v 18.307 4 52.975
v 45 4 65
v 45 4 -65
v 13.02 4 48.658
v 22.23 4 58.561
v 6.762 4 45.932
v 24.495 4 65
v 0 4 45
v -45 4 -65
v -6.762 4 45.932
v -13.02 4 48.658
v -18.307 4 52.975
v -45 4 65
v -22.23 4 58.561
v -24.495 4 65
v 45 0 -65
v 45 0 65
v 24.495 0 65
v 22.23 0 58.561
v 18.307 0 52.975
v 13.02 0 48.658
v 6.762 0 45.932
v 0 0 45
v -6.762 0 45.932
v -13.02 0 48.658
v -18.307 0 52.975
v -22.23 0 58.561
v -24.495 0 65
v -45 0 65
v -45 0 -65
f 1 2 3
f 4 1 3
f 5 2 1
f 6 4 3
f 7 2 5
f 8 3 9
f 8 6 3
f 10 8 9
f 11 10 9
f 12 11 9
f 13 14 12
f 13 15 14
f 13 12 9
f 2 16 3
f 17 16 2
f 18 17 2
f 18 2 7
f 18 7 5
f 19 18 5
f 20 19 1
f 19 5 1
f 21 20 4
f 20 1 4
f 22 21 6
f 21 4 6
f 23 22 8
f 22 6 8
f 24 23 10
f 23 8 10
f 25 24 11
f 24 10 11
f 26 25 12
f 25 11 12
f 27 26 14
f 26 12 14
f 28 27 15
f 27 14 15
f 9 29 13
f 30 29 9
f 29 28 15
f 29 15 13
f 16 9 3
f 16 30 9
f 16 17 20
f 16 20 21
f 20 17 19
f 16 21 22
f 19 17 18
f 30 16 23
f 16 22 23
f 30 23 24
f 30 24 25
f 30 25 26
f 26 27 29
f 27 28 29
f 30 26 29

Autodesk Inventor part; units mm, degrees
ref_plane "YZ Plane" through (0, 0, 0) normal (1, 0, 0) x (0, 1, 0)
ref_plane "XZ Plane" through (0, 0, 0) normal (0, 1, 0) x (-1, 0, 0)
ref_plane "XY Plane" through (0, 0, 0) normal (0, 0, 1) x (1, 0, 0)
sketch "Sketch1" plane through (0, 0, 0) normal (0, 1, 0) x (-1, 0, 0)
  line L0 (-45, 65) -> (45, 65)
  line L1 (45, 65) -> (45, -65)
  line L2 (45, -65) -> (-45, -65)
  line L3 (-45, -65) -> (-45, 65)
  line L4 (-45, 65) -> (45, -65) construction
  line L5 (45, 65) -> (-45, -65) construction
  point P0 (0, 0)
  dimension "d1" = 90
  dimension "d2" = 130
extrude "Extrusion1" add sketch "Sketch1" along normal blind 4
sketch "Sketch2" plane through (0, 4, 0) normal (0, 1, 0) x (1, 0, 0)
  line L0 (-45, -65) -> (45, -65) projected
  arc A0 (24.4949, -65) -> (-24.4949, -65) centre (0, -70) ccw
  line L1 (0, -70) -> (0, 0) construction
  dimension "d5" = 25
  dimension "d6" = 5
extrude "Extrusion2" cut sketch "Sketch2" against normal blind 4
properties part number "Plate 1"
